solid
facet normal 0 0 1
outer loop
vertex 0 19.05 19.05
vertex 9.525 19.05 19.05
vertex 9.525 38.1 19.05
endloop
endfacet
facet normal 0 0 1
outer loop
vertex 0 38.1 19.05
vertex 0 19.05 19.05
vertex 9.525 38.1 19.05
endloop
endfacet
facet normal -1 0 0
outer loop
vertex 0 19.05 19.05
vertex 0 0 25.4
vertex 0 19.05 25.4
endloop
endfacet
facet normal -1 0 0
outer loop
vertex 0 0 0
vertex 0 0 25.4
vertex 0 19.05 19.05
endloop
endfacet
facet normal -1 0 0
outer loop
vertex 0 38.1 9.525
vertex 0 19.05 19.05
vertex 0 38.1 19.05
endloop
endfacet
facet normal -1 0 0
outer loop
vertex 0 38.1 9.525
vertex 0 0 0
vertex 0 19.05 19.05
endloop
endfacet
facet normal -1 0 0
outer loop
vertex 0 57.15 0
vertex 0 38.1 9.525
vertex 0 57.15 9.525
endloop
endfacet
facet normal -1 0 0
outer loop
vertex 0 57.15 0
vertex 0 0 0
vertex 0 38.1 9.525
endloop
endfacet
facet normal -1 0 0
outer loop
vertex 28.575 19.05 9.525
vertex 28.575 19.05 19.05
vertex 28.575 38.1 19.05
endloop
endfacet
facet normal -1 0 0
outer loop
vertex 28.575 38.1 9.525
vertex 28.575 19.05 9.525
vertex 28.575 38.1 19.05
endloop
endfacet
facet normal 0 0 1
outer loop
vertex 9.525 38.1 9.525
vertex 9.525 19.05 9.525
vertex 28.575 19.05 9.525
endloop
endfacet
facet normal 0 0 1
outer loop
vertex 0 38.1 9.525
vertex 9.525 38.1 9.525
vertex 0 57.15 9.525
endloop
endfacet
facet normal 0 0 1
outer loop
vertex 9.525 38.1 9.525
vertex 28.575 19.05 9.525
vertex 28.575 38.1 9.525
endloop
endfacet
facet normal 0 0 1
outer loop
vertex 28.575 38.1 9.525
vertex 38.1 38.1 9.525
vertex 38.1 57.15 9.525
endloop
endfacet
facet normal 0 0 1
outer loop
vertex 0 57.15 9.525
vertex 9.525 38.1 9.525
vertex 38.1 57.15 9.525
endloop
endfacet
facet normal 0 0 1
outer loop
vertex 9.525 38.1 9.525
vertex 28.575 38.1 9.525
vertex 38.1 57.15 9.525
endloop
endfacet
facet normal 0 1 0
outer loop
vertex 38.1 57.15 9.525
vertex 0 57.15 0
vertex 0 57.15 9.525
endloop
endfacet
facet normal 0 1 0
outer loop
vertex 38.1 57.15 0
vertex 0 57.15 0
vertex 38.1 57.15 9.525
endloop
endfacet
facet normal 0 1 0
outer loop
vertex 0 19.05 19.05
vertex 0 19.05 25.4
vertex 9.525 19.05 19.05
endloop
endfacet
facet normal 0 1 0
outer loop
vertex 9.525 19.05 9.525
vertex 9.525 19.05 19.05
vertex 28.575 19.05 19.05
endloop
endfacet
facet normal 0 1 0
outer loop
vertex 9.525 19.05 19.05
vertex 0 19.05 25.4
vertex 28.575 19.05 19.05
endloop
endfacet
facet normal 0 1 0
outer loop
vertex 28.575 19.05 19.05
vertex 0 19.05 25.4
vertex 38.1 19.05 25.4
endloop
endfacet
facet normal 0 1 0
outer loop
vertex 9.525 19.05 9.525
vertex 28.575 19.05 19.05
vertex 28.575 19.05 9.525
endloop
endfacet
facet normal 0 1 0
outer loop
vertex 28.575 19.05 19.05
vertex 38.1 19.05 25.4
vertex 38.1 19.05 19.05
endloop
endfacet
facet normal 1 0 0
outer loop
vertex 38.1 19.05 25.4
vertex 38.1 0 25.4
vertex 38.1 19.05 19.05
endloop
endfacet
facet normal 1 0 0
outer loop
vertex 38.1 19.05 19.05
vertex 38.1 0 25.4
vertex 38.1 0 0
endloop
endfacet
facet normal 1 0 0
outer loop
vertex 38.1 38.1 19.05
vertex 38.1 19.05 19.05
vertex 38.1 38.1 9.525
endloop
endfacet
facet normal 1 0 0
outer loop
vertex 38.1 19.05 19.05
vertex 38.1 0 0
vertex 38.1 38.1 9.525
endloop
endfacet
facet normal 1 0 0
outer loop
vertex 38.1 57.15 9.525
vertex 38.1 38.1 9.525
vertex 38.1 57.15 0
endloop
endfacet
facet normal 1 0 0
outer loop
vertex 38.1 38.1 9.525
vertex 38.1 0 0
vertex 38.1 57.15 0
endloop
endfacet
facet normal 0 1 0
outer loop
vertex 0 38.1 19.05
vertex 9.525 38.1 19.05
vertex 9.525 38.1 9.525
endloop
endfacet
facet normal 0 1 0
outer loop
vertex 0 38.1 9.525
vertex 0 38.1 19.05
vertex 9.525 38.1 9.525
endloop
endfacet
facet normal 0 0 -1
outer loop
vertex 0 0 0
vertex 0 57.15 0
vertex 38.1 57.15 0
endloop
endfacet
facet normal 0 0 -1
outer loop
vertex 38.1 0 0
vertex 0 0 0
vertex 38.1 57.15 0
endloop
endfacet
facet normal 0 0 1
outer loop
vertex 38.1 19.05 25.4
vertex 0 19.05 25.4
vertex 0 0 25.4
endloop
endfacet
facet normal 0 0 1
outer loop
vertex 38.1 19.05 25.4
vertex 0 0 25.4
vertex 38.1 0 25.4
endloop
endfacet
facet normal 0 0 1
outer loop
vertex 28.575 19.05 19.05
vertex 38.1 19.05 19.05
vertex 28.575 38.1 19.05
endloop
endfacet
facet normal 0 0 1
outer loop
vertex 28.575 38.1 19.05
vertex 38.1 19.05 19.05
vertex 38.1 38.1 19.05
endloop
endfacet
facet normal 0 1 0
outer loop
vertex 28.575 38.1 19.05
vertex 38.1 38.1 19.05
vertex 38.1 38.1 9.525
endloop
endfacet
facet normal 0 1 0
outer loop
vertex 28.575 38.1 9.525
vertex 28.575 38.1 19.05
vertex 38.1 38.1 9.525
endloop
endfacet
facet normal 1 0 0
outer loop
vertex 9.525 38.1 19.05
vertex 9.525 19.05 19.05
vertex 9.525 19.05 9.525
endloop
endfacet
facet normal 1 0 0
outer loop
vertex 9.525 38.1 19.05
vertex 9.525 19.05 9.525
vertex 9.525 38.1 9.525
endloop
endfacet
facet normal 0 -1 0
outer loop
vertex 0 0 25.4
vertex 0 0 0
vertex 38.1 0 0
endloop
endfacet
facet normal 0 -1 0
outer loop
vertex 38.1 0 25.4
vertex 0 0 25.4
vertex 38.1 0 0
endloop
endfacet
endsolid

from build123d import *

# Parameters (mm, degrees)
F0_W     = 38.1
F0_H     = 57.15
F1_DEPTH = 25.4
F3_DEPTH = 38.101
F4_W     = 19.05
F4_H     = 19.05
F5_DEPTH = 9.525


with BuildPart() as f1:
    # F0 (on Top) → F1 (new body)
    with BuildSketch(Plane.XY):
        with Locations((19.05, 28.575)):
            Rectangle(F0_W, F0_H)
    extrude(amount=F1_DEPTH)

    # F2 (on face) → F3 (cut, through all)
    with BuildSketch(Plane.YZ.offset(38.1)):
        Polygon((57.15, 25.4), (19.05, 25.4), (19.05, 19.05), (38.1, 19.05), (38.1, 9.525), (57.15, 9.525), align=None)
    extrude(amount=-F3_DEPTH, mode=Mode.SUBTRACT)

    # F4 (on face) → F5 (cut)
    with BuildSketch(Plane.XY.offset(19.05)):
        with Locations((19.05, 28.575)):
            Rectangle(F4_W, F4_H)
    extrude(amount=-F5_DEPTH, mode=Mode.SUBTRACT)


solid = f1.part
